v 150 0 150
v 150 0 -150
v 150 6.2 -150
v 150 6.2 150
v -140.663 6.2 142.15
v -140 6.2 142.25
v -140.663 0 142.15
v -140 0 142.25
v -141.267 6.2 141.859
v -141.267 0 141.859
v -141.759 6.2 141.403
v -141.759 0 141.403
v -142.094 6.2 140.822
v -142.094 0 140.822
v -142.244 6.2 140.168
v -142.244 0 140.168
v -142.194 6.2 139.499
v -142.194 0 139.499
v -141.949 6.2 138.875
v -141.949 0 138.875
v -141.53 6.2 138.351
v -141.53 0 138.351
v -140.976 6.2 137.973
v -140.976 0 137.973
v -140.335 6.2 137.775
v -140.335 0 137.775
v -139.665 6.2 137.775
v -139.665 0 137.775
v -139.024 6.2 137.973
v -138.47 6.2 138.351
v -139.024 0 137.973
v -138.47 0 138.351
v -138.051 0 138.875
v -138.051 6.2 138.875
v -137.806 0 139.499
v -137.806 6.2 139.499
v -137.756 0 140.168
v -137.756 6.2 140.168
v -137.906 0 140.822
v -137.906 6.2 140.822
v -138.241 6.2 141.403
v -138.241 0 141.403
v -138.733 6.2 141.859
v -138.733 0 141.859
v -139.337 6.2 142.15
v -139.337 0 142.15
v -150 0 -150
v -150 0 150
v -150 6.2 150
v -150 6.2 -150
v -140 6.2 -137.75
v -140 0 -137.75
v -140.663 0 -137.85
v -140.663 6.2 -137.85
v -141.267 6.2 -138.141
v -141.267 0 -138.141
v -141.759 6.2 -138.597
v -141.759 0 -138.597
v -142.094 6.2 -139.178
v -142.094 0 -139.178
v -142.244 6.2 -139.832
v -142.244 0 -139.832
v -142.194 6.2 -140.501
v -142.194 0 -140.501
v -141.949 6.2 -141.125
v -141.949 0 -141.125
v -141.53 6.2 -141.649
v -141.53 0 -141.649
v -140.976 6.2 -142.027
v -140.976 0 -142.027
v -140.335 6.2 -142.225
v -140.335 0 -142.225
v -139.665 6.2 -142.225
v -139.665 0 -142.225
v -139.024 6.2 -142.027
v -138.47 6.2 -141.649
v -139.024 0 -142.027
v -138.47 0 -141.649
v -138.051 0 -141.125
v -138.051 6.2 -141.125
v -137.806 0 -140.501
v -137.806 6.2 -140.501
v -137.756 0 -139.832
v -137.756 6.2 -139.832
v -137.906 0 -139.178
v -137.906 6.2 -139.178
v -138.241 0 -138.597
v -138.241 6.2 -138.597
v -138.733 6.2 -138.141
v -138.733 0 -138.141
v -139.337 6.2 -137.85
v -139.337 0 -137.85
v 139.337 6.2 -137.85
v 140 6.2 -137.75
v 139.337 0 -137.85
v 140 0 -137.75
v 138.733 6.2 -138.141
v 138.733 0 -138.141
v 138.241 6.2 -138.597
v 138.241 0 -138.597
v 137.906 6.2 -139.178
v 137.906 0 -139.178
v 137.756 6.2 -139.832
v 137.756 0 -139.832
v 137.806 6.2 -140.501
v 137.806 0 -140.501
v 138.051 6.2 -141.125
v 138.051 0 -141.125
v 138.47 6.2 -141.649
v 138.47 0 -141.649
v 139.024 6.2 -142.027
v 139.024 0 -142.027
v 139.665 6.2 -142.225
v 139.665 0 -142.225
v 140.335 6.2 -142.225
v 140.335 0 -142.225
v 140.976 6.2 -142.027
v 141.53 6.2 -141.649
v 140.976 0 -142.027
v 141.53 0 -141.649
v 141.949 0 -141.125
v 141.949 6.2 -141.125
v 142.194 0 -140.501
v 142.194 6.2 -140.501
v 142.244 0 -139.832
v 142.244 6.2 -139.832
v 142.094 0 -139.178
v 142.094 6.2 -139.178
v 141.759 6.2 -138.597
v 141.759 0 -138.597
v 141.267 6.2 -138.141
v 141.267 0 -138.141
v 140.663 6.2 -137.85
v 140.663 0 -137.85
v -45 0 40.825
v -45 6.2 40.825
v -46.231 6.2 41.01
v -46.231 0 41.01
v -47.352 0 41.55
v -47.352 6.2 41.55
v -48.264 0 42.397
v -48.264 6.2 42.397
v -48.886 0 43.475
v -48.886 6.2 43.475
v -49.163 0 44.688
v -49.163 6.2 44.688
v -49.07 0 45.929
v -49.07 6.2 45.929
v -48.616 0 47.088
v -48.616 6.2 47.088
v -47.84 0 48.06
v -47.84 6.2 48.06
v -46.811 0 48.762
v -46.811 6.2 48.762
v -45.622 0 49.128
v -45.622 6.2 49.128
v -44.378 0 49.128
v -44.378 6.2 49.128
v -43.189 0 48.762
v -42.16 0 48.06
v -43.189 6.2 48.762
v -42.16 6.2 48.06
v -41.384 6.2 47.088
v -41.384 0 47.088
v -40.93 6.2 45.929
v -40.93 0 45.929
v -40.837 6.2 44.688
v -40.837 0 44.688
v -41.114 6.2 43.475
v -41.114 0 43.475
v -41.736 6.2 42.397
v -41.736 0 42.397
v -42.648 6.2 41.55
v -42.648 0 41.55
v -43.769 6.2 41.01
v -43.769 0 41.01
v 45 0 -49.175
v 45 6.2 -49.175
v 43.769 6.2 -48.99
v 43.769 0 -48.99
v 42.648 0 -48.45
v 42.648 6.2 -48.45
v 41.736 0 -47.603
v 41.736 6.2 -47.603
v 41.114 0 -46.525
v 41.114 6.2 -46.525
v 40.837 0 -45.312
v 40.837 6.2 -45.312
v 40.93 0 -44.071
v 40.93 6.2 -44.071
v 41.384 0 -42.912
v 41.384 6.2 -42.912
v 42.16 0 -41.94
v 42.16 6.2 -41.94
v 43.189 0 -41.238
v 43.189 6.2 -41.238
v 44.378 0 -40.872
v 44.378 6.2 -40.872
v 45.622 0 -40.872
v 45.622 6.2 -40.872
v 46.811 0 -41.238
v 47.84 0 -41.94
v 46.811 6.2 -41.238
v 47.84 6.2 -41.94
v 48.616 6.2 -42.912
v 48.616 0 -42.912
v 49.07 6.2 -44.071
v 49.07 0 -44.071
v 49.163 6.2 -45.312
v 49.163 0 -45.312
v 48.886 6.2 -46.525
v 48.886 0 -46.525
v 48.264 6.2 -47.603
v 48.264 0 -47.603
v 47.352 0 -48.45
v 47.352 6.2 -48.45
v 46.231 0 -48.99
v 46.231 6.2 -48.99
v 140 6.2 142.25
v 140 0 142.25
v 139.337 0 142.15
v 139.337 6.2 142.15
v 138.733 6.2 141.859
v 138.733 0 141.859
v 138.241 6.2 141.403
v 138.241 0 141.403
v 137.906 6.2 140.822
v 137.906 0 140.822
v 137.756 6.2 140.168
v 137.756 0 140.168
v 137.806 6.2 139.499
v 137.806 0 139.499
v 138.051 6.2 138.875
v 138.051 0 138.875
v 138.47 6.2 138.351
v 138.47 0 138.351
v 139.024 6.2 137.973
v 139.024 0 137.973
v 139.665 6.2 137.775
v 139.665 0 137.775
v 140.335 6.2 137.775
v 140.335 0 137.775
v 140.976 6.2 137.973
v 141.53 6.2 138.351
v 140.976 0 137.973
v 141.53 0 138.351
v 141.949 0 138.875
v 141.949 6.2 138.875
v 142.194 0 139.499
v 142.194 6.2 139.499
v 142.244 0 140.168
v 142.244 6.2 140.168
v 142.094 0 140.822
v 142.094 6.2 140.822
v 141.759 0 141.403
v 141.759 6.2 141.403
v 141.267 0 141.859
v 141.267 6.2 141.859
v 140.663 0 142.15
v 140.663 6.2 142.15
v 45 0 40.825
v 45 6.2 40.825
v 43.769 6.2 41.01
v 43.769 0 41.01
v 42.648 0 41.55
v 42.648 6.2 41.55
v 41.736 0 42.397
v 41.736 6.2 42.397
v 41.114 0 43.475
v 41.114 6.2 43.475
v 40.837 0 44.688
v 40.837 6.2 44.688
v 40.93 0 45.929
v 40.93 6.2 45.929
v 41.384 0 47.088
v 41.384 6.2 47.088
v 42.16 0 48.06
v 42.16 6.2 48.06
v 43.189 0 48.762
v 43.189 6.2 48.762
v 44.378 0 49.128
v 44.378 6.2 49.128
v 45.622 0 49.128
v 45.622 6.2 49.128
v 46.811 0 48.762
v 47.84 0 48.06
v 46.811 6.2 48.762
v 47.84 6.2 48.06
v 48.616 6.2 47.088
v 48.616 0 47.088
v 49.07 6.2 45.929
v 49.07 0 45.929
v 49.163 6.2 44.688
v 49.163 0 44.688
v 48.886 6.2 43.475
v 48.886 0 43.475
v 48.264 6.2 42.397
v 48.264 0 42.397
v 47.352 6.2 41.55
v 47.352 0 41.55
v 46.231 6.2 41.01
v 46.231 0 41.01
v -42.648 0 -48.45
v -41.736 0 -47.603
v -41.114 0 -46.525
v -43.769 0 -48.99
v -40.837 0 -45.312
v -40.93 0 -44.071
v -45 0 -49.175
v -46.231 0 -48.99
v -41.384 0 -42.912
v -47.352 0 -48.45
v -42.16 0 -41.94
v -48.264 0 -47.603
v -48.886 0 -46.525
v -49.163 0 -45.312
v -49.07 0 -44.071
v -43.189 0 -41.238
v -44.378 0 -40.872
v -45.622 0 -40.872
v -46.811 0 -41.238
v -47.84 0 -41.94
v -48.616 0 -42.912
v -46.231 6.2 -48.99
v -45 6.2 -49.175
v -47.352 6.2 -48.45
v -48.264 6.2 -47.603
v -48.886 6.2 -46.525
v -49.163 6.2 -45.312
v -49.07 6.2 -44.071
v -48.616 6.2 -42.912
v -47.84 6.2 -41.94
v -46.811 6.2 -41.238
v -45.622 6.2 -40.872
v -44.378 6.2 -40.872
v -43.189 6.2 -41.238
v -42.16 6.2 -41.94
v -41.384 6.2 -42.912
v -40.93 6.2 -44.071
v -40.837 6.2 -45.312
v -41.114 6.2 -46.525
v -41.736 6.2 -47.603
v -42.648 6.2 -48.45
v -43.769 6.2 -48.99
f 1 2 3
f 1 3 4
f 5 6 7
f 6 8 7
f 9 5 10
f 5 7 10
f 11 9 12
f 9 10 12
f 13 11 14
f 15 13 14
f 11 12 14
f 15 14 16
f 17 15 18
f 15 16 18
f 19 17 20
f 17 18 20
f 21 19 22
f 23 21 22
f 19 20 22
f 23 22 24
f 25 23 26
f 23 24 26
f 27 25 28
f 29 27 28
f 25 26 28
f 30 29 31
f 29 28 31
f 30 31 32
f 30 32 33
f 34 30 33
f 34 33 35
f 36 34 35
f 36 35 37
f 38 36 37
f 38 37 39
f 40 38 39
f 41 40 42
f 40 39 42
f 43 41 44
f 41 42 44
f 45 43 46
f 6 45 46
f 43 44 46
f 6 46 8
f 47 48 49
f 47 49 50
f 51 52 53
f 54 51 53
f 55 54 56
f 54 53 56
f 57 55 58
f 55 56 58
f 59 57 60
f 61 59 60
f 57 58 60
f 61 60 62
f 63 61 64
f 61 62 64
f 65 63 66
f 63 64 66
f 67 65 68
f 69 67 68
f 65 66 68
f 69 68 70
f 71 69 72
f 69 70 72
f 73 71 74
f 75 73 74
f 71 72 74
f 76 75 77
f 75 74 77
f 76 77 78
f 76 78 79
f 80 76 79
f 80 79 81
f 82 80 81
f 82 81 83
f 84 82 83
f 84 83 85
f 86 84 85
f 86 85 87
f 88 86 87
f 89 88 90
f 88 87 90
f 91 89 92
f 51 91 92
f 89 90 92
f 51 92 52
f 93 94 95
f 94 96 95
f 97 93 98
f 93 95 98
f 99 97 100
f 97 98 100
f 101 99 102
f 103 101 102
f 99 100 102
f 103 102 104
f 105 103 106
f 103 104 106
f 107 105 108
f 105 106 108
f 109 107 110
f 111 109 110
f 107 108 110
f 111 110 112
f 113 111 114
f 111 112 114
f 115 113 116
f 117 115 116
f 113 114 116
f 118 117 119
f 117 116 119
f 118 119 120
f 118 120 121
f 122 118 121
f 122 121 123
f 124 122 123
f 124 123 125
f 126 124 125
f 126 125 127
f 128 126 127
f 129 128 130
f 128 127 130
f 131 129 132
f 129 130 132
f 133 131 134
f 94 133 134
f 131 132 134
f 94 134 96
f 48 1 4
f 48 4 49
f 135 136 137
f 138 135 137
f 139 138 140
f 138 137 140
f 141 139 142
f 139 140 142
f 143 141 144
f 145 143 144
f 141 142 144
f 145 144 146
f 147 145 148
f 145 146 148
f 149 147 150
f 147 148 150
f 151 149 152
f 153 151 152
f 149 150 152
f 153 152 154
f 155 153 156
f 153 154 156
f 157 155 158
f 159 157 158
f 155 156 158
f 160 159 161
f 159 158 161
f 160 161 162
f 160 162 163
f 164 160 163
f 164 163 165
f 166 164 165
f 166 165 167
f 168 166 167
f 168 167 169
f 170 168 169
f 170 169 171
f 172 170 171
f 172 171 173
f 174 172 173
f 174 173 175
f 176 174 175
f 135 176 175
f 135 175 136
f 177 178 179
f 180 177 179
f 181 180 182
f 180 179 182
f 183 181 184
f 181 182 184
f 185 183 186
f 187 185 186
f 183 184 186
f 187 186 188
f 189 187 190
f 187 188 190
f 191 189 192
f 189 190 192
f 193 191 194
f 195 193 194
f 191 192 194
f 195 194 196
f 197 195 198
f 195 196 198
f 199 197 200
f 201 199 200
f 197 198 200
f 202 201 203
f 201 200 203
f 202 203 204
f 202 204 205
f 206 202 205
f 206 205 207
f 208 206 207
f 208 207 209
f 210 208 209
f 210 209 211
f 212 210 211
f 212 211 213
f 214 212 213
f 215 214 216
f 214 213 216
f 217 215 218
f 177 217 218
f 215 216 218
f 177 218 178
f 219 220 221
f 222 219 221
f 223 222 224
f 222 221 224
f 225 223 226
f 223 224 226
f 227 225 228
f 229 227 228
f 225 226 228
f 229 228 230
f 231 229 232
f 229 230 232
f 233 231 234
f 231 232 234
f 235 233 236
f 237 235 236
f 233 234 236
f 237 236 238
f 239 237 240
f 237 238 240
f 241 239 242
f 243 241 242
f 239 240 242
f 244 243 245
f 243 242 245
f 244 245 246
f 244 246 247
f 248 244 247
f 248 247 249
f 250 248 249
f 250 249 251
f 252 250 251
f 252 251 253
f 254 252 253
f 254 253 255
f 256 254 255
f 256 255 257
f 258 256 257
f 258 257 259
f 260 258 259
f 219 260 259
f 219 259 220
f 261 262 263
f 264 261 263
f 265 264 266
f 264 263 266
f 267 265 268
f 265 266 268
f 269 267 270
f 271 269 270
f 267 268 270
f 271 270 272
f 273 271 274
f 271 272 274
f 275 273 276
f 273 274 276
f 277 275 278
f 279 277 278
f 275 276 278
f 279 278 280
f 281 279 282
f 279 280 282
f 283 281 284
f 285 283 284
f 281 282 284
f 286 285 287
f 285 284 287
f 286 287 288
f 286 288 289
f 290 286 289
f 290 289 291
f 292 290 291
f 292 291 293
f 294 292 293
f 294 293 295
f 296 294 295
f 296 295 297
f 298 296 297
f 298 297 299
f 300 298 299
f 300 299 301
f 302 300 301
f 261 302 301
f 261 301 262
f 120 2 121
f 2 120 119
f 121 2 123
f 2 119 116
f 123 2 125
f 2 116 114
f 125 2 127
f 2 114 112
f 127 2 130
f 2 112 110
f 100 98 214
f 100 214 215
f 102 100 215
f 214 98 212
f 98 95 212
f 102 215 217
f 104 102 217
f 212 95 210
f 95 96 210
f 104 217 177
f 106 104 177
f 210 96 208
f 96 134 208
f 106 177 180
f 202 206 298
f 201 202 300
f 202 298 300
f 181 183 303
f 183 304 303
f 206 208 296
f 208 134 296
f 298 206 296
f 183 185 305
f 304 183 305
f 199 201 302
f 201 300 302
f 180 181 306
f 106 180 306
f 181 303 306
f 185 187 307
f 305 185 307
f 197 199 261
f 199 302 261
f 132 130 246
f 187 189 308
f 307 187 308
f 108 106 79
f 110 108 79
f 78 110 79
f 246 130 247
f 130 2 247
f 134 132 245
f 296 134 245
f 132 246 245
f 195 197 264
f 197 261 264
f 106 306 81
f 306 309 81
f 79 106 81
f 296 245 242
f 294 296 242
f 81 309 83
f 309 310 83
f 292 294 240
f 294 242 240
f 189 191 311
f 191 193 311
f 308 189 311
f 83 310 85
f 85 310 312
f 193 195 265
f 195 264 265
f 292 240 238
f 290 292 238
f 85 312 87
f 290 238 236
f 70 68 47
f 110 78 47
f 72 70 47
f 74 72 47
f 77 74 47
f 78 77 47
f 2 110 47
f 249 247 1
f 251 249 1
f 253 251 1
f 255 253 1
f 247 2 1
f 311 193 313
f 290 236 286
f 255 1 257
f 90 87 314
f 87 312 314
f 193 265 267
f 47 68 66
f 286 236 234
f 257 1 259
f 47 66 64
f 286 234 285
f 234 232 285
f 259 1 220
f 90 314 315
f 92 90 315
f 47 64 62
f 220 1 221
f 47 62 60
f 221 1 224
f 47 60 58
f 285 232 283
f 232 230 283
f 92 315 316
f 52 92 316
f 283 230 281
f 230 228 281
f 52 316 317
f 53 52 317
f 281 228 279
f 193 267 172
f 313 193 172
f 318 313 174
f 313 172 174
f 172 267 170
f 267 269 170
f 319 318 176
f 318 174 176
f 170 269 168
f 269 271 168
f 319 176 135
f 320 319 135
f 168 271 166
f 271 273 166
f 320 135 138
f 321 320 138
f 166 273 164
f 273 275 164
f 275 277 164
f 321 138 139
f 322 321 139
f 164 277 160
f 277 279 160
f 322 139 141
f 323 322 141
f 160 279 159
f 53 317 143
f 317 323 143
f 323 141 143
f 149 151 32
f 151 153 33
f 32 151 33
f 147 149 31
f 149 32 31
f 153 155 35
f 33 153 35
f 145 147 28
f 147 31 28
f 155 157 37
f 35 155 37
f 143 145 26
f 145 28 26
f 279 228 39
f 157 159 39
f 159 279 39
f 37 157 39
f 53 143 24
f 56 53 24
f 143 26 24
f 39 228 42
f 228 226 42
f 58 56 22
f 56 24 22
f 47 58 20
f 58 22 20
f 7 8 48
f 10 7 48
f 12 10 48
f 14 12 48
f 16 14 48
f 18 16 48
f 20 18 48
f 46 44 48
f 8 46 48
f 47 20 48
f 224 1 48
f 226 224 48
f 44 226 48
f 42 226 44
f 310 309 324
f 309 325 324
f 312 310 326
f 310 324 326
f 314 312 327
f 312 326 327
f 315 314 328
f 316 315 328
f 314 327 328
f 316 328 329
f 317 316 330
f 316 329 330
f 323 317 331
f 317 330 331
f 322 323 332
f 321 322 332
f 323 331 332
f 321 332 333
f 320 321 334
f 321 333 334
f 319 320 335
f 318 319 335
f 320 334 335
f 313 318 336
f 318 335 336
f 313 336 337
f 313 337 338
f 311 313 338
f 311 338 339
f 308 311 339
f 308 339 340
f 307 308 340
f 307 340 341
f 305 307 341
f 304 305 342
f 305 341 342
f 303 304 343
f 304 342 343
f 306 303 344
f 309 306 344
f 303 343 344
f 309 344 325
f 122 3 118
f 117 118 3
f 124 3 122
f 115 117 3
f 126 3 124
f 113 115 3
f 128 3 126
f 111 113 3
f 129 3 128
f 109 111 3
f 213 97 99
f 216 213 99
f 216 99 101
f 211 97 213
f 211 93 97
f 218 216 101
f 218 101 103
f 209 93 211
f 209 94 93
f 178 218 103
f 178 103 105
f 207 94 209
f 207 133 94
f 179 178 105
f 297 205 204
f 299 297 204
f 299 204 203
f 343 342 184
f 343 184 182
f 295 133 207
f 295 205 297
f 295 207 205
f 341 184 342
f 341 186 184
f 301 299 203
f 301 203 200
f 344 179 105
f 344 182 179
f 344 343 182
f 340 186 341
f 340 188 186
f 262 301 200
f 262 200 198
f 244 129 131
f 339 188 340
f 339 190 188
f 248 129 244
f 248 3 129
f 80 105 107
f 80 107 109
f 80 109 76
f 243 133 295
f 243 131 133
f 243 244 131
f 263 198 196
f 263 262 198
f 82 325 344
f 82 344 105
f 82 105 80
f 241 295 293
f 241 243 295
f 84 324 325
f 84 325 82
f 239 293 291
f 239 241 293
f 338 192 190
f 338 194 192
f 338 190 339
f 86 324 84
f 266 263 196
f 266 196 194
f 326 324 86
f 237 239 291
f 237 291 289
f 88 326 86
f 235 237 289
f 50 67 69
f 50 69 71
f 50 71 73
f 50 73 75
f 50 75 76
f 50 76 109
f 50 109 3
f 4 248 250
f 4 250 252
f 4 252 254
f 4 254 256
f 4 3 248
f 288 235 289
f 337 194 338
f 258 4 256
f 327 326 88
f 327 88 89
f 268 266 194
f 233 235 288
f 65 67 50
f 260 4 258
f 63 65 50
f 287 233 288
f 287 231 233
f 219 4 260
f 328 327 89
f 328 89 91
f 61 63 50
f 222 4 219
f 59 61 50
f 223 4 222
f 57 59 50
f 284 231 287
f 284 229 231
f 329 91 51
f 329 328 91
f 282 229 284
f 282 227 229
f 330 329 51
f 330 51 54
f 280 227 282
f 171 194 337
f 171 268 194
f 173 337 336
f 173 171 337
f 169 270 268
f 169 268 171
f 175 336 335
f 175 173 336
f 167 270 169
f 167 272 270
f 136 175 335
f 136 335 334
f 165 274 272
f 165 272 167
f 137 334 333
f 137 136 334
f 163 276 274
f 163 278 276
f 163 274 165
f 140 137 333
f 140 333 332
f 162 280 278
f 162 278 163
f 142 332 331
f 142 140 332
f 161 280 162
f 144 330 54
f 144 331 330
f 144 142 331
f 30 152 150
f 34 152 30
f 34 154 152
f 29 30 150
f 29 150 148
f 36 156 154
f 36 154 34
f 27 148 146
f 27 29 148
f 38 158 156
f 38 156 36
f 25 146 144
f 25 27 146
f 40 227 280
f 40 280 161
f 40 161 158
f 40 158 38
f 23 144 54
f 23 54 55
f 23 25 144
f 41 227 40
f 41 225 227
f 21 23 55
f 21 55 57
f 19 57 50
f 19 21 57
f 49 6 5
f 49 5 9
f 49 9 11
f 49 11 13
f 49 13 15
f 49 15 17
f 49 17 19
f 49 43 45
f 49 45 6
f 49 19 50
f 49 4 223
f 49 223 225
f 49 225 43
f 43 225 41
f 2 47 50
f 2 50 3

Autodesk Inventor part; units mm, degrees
ref_plane "YZ Plane" through (0, 0, 0) normal (1, 0, 0) x (0, 1, 0)
ref_plane "XZ Plane" through (0, 0, 0) normal (0, 1, 0) x (-1, 0, 0)
ref_plane "XY Plane" through (0, 0, 0) normal (0, 0, 1) x (1, 0, 0)
sketch "Sketch1" plane through (0, 0, 0) normal (0, 1, 0) x (-1, 0, 0)
  line L0 (150, -150) -> (-150, -150)
  line L1 (-150, -150) -> (-150, 150)
  line L2 (-150, 150) -> (150, 150)
  line L3 (150, 150) -> (150, -150)
  line L4 (150, -150) -> (-150, 150) construction
  line L5 (-150, -150) -> (150, 150) construction
  point P0 (0, 0)
  point P1 (45, 45)
  point P2 (-45, 45)
  point P3 (-45, -45)
  point P4 (45, -45)
  dimension "d0" = 300
  dimension "d1" = 300
  dimension "d2" = 45
  dimension "d4" = 45
  dimension "d5" = 45
  dimension "d6" = 45
extrude "Extrusion1" add sketch "Sketch1" along normal blind 6.2
hole "Hole1" at (-45, 0, 45) at (45, 0, 45) at (45, 0, -45) at (-45, 0, -45) direction (0, 1, 0) diameter 8.35 end through all
sketch "Sketch2" plane through (0, 6.2, 0) normal (0, 1, 0) x (1, 0, 0)
  line L0 (-150, -150) -> (150, -150) projected
  line L1 (-150, 150) -> (-150, -150) projected
  line L2 (150, 150) -> (-150, 150) projected
  line L3 (150, -150) -> (150, 150) projected
  point P0 (0, 0)
  point P1 (-140, -140)
  point P2 (140, -140)
  point P3 (140, 140)
  point P4 (-140, 140)
  dimension "d16" = 10
  dimension "d17" = 10
  dimension "d18" = 10
  dimension "d19" = 10
hole "Hole2" at (140, 6.2, 140) at (140, 6.2, -140) at (-140, 6.2, -140) at (-140, 6.2, 140) direction (0, -1, 0) diameter 4.5 end through all
properties part number "Base_Mdf" material "Wood (Birch)"
